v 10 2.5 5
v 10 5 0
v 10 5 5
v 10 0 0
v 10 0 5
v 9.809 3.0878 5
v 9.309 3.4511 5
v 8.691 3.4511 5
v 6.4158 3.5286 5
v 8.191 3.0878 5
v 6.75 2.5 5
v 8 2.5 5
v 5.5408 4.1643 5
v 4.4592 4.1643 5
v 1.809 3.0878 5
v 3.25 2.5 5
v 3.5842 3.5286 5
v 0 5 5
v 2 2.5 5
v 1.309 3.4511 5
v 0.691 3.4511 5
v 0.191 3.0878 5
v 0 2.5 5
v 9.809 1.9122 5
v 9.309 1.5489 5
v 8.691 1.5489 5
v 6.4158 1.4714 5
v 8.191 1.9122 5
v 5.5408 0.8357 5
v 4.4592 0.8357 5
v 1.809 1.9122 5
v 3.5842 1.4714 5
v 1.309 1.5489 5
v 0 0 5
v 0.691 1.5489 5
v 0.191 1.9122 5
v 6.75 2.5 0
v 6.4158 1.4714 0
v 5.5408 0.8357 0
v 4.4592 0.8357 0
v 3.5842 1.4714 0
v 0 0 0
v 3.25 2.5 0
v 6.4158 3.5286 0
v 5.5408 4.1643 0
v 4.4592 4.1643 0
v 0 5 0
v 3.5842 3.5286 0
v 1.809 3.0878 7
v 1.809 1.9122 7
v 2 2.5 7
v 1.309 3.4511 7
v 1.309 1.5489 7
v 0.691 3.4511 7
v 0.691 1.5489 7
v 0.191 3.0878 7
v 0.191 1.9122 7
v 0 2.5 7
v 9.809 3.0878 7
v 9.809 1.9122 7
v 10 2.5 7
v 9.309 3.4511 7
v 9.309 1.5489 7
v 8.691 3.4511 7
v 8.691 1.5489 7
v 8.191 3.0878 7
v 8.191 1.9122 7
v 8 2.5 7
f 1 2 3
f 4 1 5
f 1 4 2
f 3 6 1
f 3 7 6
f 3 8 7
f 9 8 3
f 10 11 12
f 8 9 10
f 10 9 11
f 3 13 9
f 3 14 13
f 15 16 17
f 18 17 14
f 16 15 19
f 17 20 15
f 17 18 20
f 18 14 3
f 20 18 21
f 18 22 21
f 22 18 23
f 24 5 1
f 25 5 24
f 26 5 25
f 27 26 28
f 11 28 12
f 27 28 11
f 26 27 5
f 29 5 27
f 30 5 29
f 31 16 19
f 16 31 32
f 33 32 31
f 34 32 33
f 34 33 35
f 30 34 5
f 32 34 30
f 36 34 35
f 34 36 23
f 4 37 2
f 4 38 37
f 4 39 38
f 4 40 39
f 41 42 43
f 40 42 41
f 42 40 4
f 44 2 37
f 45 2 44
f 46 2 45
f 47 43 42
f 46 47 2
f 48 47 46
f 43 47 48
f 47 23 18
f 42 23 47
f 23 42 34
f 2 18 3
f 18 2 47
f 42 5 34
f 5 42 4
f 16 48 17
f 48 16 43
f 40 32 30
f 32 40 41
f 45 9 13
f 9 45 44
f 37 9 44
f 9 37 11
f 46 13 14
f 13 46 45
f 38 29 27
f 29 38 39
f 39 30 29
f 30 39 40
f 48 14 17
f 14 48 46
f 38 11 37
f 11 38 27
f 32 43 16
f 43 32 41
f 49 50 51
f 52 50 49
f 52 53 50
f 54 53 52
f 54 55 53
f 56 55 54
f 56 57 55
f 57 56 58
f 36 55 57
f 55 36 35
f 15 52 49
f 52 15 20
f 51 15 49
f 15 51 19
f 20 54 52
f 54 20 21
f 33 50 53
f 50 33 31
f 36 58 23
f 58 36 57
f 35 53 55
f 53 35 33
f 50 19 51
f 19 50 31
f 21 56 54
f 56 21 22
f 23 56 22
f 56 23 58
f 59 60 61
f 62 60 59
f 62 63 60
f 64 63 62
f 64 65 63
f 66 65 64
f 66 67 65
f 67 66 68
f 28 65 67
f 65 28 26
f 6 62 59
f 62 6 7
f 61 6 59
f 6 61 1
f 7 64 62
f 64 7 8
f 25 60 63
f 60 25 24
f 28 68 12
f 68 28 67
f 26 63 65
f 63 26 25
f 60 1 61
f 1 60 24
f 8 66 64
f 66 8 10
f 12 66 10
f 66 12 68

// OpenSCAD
$fn = 10;

difference() {
    cube([10, 5, 5]);
    translate([5, 2.5, -1]) cylinder(d=3.5, h = 7);
}
translate([1, 2.5, 0]) cylinder(d=2, h = 7);
translate([9, 2.5, 0]) cylinder(d=2, h = 7);
